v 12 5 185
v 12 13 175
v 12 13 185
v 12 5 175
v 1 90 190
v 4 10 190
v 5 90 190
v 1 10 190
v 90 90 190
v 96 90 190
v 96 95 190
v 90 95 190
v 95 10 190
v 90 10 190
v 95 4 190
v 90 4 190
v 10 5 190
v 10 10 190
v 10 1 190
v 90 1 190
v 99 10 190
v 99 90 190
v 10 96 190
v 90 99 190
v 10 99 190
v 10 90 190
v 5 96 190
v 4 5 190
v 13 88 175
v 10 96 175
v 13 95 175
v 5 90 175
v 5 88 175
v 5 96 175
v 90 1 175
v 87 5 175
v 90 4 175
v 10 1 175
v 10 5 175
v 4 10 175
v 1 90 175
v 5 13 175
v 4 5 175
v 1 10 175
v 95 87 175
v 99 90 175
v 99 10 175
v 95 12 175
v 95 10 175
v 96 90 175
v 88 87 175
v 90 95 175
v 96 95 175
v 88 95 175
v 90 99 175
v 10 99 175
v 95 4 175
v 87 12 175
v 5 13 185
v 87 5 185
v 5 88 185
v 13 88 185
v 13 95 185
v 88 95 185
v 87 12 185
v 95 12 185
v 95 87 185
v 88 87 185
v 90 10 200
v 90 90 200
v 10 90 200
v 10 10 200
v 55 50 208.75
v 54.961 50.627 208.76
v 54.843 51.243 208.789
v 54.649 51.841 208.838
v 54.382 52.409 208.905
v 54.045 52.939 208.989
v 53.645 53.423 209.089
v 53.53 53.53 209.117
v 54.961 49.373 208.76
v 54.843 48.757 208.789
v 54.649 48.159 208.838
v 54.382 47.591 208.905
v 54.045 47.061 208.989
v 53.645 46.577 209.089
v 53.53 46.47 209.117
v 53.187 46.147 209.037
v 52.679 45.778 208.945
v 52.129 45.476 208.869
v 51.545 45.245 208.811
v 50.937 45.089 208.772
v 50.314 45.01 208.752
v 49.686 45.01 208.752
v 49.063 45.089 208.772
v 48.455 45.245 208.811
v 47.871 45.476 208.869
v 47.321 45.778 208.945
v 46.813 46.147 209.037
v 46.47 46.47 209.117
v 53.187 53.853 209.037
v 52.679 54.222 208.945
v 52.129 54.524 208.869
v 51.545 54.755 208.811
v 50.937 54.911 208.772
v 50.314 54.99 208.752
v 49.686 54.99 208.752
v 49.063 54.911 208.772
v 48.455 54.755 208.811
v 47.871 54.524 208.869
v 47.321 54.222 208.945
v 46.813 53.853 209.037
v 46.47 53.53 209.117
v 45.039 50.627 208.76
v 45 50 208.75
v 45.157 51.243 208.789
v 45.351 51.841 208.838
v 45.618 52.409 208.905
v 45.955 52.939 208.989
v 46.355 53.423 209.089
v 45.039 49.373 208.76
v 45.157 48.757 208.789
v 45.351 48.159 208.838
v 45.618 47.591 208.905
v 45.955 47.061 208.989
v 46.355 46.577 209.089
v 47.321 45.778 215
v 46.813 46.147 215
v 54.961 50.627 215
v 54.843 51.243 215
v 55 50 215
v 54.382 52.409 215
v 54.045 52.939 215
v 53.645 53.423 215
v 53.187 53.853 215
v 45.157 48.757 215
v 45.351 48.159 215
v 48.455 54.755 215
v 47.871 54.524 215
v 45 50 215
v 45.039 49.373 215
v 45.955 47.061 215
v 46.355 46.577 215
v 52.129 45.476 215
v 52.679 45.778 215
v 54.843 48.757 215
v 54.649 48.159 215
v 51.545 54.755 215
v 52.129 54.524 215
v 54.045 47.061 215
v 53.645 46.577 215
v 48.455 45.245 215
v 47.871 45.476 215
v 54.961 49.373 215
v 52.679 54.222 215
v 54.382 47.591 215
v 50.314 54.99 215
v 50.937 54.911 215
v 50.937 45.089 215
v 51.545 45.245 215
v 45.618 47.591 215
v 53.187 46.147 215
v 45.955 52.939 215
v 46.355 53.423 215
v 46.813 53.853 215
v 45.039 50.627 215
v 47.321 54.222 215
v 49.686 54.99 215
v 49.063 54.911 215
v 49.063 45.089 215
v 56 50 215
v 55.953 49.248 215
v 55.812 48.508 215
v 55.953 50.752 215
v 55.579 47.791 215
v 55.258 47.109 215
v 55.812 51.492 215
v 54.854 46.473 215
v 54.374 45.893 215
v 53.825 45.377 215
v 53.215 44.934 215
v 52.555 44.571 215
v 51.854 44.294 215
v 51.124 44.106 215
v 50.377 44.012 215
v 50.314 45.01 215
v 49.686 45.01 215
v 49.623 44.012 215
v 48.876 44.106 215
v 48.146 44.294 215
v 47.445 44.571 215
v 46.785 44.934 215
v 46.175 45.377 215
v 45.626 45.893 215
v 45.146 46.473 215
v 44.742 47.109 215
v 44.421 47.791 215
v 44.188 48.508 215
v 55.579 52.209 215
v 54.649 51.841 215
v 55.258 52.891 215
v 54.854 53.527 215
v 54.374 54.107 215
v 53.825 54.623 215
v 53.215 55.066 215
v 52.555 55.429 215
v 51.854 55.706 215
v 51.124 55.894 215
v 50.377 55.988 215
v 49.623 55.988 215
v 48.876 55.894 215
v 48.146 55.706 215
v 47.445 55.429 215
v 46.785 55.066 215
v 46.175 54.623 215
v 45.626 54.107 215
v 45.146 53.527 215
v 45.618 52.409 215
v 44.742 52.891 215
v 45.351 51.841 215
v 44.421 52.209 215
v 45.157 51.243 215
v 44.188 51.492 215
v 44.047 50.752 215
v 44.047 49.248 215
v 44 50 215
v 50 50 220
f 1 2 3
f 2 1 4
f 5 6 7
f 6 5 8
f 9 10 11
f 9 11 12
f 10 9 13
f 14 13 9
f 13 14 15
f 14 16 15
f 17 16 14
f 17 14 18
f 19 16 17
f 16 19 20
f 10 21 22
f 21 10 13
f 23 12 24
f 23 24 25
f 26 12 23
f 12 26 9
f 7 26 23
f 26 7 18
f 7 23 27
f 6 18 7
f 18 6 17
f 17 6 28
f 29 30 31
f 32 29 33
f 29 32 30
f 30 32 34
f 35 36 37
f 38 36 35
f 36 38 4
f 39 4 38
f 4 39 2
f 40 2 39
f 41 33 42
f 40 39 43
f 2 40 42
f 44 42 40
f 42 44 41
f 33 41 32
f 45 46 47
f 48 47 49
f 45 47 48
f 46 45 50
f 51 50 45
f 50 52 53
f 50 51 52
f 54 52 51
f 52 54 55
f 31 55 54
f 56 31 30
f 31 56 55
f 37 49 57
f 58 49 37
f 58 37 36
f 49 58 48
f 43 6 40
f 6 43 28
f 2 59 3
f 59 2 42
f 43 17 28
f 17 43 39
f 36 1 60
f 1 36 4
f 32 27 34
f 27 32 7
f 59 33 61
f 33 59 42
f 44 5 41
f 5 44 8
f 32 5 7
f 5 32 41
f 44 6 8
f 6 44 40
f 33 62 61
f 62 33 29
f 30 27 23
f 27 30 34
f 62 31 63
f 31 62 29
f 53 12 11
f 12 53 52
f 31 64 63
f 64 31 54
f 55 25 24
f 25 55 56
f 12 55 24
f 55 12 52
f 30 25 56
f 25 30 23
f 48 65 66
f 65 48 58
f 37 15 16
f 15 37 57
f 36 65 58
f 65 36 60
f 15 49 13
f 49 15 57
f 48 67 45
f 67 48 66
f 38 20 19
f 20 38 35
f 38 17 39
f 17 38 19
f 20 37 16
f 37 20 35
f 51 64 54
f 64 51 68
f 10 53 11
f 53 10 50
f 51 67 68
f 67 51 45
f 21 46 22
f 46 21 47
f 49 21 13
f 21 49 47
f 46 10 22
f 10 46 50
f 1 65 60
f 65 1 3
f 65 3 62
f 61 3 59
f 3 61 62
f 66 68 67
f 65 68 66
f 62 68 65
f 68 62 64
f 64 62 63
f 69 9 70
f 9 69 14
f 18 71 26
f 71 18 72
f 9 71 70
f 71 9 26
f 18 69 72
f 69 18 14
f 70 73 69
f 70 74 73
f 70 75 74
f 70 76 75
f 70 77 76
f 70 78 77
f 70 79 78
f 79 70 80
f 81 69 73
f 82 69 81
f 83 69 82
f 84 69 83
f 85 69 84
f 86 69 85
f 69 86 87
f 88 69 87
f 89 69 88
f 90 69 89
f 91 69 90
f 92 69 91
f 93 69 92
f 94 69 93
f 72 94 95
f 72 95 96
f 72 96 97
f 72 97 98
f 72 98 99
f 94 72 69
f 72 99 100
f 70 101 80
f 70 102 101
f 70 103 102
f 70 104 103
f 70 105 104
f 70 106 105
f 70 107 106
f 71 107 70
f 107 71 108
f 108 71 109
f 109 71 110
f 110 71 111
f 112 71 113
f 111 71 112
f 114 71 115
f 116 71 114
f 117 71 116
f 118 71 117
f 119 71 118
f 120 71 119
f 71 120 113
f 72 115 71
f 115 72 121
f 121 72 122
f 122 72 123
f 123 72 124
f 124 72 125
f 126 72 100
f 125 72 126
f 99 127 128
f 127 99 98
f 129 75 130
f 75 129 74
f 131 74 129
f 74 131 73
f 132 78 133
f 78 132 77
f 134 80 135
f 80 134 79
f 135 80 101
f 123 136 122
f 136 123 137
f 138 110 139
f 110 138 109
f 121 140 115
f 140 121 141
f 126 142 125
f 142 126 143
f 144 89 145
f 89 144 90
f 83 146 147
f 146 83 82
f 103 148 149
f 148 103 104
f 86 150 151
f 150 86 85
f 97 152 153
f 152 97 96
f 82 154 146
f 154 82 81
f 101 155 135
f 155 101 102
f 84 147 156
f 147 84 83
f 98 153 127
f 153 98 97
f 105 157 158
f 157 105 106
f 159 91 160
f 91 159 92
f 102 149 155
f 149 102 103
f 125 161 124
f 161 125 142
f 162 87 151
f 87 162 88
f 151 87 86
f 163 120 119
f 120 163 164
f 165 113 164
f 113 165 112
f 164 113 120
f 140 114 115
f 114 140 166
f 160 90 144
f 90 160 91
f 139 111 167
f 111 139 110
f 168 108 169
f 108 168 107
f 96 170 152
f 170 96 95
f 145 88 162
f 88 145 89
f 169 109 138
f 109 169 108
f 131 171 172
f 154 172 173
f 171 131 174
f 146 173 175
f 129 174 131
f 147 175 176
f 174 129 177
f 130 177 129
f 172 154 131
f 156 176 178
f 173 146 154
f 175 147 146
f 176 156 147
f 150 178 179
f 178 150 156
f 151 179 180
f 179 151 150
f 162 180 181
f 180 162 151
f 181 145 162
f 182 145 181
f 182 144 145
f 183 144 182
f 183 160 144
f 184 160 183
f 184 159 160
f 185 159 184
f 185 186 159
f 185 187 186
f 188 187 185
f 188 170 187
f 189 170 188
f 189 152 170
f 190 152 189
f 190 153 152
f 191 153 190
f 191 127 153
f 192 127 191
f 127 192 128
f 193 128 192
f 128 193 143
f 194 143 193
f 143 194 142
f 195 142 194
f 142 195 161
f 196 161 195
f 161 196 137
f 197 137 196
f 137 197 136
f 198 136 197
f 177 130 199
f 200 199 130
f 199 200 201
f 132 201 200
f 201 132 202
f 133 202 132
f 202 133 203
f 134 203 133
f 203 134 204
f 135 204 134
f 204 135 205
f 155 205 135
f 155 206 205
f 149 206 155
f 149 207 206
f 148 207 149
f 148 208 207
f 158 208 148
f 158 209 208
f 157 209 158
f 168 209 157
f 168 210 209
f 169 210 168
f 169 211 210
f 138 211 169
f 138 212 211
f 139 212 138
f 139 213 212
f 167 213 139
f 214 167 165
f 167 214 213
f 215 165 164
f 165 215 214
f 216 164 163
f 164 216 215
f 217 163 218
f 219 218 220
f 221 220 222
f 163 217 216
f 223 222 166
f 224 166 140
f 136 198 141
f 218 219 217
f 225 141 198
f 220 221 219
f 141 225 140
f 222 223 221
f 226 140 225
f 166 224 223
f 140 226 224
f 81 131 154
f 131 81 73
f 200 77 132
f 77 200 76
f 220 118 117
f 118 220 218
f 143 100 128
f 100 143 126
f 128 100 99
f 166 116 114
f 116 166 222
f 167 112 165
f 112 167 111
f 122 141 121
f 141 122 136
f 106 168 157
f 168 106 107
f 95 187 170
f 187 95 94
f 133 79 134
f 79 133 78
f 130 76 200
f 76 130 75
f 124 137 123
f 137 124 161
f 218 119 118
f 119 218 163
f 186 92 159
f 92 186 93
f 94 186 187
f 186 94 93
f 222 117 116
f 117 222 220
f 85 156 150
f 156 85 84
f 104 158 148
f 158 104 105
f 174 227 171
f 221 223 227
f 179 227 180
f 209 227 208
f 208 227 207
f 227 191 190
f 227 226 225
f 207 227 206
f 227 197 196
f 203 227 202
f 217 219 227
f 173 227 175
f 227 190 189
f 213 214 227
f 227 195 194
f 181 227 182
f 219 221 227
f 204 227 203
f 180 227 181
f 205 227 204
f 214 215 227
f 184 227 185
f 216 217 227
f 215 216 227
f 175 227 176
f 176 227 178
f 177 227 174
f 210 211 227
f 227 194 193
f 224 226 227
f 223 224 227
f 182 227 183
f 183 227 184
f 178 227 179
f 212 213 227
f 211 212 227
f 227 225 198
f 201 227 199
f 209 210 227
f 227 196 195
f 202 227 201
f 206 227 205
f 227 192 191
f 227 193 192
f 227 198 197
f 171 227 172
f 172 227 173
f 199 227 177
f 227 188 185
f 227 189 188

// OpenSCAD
hight=180;

module base() {
  difference() {
   cube ([100,100,5]);
   translate([10,10,0])       
    cube ([80,80,5]);
  };
  translate([10,10,5])
    cube ([80,80,5]);
}   

module wallDip(x, y, z) {        
  translate([x,y,z])
      cube([25,5,35]);
}


module window(x,y,z) {
  windownHight = 16;
  windownWith = 7;
  spaceing = 1;
    
  translate([x,y,z]) {
    translate([spaceing,0,1])
      cube([windownWith,6,windownHight]);
    translate([(windownWith+(spaceing*2)),0,1])
      cube([windownWith,6,windownHight]);
    translate([((windownWith*2)+(spaceing*3)),0,1])
      cube([windownWith,6,windownHight]);
  }
    
}

module wall() {
//    seulen
  cube([8,8,hight]);
//    seite
  translate([43,3,0])
    cube([4,3,hight]);


  difference() {
    translate([0,4,0])
      cube([90,4,hight]);
    wallDip(15,0,10);
    wallDip(50,0,10);
    wallDip(15,0,50);
    wallDip(50,0,50);
    wallDip(15,0,90);
    wallDip(50,0,90);
    wallDip(15,0,130);
    wallDip(50,0,130);
    window(15,0,130);
    window(15,0,147);
    window(50,0,130); 
    window(50,0,147);
  }

};

module door() {
//    cube([10,10,200]);
//    translate([80,0,0])
//        cube([10,10,hight]);
//    translate([0,3,0])
//        cube([80,2,hight]);
};


module tardisBody() {
  translate([5,5,0])
    wall();    
  translate([5,95,0])
    rotate([0,0,-90])
    wall();
  translate([95,5,0])
    rotate([0,0,90])
    wall();
  translate([95,95,0])
    rotate([0,0,180])
    difference() {
      wall();
    }
};

module roof() {

  module schild() {
    translate([-4,5,(hight-5)])
      cube([4,80,15]);
  }

  module balken() {
    translate([-1,0,(hight-5)])
      cube([8,8,15]);
    schild();
  };

  color( "blue", 5 ) {
  translate([5,5,0])
    balken();    
  translate([5,95,0])
    rotate([0,0,-90])
    balken();
  translate([95,5,0])
    rotate([0,0,90])
    balken();
  translate([95,95,0])
    rotate([0,0,180])
    balken();

  translate([5,5,(hight + 5)])
    cube([90,90,5]);

  translate([10,10,(hight + 5)])
    cube([80,80,15]);

  }
  color("Red", 1) {
    translate([50,50,(hight+20)]){
      polyhedron(
        points=[ [40,40,0],[40,-40,0],[-40,-40,0],[-40,40,0], // the four points at base
                 [0,0,10]  ],                                 // the apex point 
        faces=[ [0,1,4],[1,2,4],[2,3,4],[3,0,4],              // each triangle side
                    [1,0,3],[2,1,3] ]                         // two triangles for square base
       );
    };
  };

  translate([50,50,(hight + 5)]){ 
    cylinder(30,5,5, $fn=50);
  }
  translate([50,50,(hight+35)]){ 
    cylinder(5,6,0, $fn=50);
  }
  // translate([50,50,(hight+40)]){ 
  //   cylinder(6,0.5,0.5, $fn=50);
  // }

};

// base();
// color("Red", 1) {

//   difference() {
//     tardisBody();
//     roof();
//     translate([5,5,(hight - 5)]){
//       cube(size=[8,8,hight], center=false);
//     }
//     translate([5,87,(hight - 5)]){
//       cube(size=[8,8,hight], center=false);
//     }
//     translate([87,5,(hight - 5)]){
//       cube(size=[8,8,hight], center=false);
//     }
//     translate([87,87,(hight - 5)]){
//       cube(size=[8,8,hight], center=false);
//     }
//   }
// }
roof();
  
  // difference() {
  //   roof();
  //   tardisBody();
  // }
